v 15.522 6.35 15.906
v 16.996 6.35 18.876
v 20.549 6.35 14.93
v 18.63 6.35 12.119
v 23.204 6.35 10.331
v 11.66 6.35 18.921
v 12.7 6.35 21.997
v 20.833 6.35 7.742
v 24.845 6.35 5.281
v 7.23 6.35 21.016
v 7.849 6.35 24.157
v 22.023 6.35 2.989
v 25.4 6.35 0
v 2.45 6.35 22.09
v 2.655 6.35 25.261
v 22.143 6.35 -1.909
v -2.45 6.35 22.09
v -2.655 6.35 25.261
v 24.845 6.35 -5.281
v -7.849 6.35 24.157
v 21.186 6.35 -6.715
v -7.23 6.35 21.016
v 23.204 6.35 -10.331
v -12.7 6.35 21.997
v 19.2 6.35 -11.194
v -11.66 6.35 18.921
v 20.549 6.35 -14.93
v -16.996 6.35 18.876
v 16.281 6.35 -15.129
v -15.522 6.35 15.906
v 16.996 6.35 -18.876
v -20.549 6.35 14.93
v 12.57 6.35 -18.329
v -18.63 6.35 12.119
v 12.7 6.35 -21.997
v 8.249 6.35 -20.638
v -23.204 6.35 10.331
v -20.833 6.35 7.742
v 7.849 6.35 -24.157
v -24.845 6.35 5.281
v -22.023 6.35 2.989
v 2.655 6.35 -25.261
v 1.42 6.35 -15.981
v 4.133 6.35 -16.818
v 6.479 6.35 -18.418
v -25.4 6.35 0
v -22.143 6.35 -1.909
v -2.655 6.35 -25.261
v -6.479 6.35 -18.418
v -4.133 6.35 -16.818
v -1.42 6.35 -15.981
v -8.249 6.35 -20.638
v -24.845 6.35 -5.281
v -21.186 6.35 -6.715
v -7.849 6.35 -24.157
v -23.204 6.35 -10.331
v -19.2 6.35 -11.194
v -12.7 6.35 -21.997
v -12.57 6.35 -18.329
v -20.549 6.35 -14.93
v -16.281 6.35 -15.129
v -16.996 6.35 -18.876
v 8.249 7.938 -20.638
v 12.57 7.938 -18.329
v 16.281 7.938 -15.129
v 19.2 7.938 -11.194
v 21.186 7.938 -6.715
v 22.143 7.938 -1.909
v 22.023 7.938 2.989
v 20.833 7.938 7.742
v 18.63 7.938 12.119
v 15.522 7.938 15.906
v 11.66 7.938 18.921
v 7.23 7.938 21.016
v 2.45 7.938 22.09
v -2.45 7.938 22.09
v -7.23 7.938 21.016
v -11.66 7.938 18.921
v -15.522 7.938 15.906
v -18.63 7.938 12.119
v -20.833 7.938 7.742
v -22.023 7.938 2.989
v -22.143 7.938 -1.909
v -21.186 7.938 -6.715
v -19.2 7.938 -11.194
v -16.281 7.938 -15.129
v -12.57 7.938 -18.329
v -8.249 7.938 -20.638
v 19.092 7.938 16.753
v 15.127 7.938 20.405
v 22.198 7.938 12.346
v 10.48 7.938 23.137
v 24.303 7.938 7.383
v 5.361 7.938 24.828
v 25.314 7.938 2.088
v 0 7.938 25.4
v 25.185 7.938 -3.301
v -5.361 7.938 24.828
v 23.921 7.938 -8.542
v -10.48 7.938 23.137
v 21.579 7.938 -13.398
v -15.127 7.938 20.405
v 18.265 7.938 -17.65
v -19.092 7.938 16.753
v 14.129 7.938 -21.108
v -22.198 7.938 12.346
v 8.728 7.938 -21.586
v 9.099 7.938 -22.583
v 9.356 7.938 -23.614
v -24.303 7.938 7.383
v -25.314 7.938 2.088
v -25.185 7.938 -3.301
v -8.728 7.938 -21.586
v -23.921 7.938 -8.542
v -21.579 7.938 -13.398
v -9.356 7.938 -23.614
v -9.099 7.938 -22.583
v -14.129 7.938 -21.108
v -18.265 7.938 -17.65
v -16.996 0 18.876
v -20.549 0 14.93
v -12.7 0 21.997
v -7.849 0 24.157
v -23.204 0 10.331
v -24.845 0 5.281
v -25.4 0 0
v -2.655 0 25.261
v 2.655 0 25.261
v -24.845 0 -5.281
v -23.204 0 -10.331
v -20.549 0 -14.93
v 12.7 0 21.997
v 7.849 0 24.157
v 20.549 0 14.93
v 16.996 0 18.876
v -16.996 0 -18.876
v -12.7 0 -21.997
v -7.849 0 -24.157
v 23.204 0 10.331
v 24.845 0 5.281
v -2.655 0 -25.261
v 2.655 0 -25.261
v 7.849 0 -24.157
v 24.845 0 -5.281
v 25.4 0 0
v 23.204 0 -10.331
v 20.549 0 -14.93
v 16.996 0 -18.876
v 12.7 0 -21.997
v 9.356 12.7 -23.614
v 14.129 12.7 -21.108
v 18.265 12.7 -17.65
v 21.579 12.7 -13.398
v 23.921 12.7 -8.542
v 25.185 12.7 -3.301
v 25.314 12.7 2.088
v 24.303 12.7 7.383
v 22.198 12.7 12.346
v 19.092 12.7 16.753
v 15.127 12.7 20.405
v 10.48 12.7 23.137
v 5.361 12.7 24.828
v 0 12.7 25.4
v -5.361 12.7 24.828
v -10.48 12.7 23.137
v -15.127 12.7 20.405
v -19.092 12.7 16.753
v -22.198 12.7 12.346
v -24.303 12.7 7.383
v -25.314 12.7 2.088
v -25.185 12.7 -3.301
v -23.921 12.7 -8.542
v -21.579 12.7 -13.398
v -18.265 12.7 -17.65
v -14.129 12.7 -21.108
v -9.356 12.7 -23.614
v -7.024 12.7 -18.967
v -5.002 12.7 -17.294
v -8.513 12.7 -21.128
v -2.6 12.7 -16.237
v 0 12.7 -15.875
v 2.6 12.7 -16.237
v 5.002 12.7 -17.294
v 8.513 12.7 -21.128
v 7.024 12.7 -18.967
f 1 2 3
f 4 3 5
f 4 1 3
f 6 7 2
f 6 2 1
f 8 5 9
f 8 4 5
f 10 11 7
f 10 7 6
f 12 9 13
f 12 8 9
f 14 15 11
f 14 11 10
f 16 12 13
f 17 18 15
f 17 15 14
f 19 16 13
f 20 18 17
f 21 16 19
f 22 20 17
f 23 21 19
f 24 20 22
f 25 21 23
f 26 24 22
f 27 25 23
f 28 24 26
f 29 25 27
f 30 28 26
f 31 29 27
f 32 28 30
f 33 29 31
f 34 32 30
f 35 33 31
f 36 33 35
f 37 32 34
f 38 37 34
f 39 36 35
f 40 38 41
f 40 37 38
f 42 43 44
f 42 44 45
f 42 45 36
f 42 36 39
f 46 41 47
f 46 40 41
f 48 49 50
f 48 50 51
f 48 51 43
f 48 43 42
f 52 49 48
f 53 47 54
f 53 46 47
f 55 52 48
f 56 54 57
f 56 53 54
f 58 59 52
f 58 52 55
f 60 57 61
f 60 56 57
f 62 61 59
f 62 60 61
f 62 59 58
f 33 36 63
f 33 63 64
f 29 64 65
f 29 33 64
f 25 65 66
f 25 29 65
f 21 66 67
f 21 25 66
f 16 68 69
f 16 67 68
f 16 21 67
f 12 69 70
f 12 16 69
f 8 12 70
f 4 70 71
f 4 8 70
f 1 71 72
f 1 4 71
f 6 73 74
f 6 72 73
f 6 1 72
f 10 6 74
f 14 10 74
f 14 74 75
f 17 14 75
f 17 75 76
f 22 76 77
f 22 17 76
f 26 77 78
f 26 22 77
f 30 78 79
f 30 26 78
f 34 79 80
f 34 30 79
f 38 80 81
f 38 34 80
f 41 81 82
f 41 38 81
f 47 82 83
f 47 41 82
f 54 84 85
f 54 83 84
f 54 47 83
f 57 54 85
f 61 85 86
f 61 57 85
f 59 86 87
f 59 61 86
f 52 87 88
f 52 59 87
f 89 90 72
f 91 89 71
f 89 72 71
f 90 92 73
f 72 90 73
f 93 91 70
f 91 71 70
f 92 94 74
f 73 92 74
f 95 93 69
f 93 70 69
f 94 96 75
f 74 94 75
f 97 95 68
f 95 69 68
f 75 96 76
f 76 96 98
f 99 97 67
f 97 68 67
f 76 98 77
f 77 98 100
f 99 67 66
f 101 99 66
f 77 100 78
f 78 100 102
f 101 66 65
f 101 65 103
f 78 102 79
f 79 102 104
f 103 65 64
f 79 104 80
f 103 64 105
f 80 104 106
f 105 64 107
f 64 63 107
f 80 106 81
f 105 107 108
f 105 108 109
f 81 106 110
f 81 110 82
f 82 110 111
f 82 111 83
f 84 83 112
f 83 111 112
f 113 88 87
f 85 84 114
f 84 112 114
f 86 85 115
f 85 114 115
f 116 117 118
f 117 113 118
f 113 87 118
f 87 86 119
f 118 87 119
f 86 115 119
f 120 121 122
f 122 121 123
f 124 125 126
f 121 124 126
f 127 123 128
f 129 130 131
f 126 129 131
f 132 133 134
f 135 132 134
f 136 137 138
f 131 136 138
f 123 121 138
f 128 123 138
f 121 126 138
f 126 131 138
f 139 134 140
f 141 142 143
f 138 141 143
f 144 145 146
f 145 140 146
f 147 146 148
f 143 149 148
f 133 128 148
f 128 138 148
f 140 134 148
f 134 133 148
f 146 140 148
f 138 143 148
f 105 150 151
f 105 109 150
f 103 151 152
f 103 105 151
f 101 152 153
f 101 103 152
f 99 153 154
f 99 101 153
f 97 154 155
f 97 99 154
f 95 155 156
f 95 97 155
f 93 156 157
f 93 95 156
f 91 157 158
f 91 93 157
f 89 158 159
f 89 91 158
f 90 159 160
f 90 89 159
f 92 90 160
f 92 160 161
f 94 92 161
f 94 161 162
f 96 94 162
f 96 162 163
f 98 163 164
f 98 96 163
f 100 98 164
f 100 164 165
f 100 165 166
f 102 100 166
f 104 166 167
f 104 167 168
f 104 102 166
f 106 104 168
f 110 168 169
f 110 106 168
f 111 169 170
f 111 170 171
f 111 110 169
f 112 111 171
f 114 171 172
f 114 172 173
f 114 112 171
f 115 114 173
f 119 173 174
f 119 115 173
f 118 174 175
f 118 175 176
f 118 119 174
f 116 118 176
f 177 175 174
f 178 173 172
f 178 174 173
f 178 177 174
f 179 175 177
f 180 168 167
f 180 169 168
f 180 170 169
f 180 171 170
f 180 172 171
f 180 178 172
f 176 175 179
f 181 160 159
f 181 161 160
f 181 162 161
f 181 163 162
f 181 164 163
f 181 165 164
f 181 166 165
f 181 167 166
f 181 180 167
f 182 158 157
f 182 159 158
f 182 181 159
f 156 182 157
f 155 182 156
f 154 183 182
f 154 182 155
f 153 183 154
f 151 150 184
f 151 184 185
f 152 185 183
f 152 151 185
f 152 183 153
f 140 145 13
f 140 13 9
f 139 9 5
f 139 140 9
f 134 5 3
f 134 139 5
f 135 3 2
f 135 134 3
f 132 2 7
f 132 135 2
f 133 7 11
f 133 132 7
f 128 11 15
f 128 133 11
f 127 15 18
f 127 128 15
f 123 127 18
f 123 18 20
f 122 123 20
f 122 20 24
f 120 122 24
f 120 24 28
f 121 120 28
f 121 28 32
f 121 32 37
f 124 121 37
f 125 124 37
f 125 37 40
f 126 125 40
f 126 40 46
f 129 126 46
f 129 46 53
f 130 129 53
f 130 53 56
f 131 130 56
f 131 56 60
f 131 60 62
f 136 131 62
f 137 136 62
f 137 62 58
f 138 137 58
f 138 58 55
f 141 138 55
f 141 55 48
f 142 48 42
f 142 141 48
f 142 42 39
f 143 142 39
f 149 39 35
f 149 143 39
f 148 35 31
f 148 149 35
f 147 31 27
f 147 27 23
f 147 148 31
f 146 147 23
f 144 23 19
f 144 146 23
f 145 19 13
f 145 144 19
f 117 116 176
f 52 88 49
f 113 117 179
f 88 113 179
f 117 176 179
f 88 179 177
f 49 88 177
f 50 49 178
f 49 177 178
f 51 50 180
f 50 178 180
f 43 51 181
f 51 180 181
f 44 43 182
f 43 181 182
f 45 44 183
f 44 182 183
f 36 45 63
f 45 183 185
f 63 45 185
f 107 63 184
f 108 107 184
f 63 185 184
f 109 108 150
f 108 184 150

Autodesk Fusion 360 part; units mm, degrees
sketch "Base" plane through (0, 0, 0) normal (0, 1, 0) x (1, 0, 0)
  circle A0 centre (0, 0) radius 25.4
  dimension "d1" = 50.8
extrude "Extrude1" add sketch "Base" along normal blind 12.7 makes body 1
sketch "Relief" plane through (0, 12.7, 0) normal (0, 1, 0) x (-1, 0, 0)
  circle A0 centre (0, 0) radius 25.4
  circle A1 centre (0, -25.4) radius 9.525
  dimension "d4" = 19.05
extrude "Extrude2" cut sketch "Relief" against normal blind 6.35 contours A0 A1 | A0 A1 picked at (1.7493, -22.2335) picked at (2.3346, -28.2419) bodies 1
sketch "Boss Ref" plane through (0, 12.7, 0) normal (0, 1, 0) x (-1, 0, 0)
  arc A0 (9.3561, -23.6141) -> (-9.3561, -23.6141) centre (0, -25.4) ccw
  arc A1 (9.3561, -23.6141) -> (-9.3561, -23.6141) centre (0, 0) ccw
  circle A2 centre (0, -10.795) radius 4.7625
  circle A3 centre (0, -10.795) radius 2.5527
  dimension "d7" = 9.525
  dimension "d8" = 10.795
  dimension "d9" = 5.1054
sketch "Revolve Cut1" plane through (0, 0, 0) normal (1, 0, 0) x (0, 0, -1)
  line L0 (25.4, 0) -> (25.4, 6.35)
  line L1 (-25.4, 12.7) -> (-25.4, 0)
  line L2 (15.875, 6.35) -> (23.6141, 6.35)
  line L3 (25.4, 6.35) -> (22.225, 6.35)
  line L4 (22.225, 7.9375) -> (25.4, 7.9375)
  line L5 (25.4, 7.9375) -> (25.4, 6.35)
  line L6 (22.225, 7.9375) -> (22.225, 6.35)
  dimension "d12" = 3.175
  dimension "d13" = 1.5875
revolve "Revolve1" cut sketch "Revolve Cut1" angle 360 about axis through (0, 1.75, 0) along (0, 1, 0) bodies 1
sketch "Sketch5" plane through (0, 12.7, 0) normal (0, 1, 0) x (-1, 0, 0)
  arc A0 (9.3561, -23.6141) -> (-9.3561, -23.6141) centre (0, -25.4) ccw
  arc A1 (9.3561, -23.6141) -> (-9.3561, -23.6141) centre (0, 0) ccw
  arc A2 (-8.2489, -20.6375) -> (-9.3561, -23.6141) centre (0, -25.4) ccw
  arc A3 (9.3561, -23.6141) -> (-9.3561, -23.6141) centre (0, 0) ccw
  arc A4 (9.3561, -23.6141) -> (8.2489, -20.6375) centre (0, -25.4) ccw
  arc A5 (8.2489, -20.6375) -> (-8.2489, -20.6375) centre (0, 0) ccw
  line L0 (0, -15.875) -> (-6.35, -9.525)
  line L1 (0, -15.875) -> (6.35, -9.525)
  line L2 (6.35, -9.525) -> (-6.35, -9.525)
  line L3 (0, -9.525) -> (0, -15.875) construction
  line L4 (6.35, -3.175) -> (-6.35, -3.175)
  line L5 (6.35, -9.525) -> (6.35, -3.175)
  line L6 (-6.35, -9.525) -> (-6.35, -3.175)
  line L7 (-6.35, -3.175) -> (-12.7, -3.175)
  line L8 (-12.7, -3.175) -> (-6.35, -9.525)
  line L9 (6.35, -9.525) -> (12.7, -3.175)
  line L10 (12.7, -3.175) -> (6.35, -3.175)
  dimension "d15" = 6.35
  dimension "d16" = 45
  dimension "d17" = 6.35
ref_plane "WorkPlane1" through (0, 0, -23.6141) normal (0, 0, 1) x (1, 0, 0)
sketch "Loft Profile 2" plane through (0, 12.7, 0) normal (0, 1, 0) x (-1, 0, 0)
  arc A0 (9.3561, -23.6141) -> (-9.3561, -23.6141) centre (0, -25.4) ccw
  arc A1 (9.3561, -23.6141) -> (-9.3561, -23.6141) centre (0, 0) ccw
  line L0 (4.7625, 8.255) -> (-4.7625, 8.255)
  arc A2 (-4.7625, 8.255) -> (-4.7625, -8.255) centre (-4.7625, 0) ccw
  line L1 (-4.7625, -8.255) -> (4.7625, -8.255)
  arc A3 (4.7625, -8.255) -> (4.7625, 8.255) centre (4.7625, 0) ccw
  line L2 (4.7625, 0) -> (-4.7625, 0) construction
  dimension "d19" = 9.525
  dimension "d20" = 8.255
sketch "Loft Profile 1" plane through (0, 0, 0) normal (0, -1, 0) x (1, 0, 0)
  circle A0 centre (0, 0) radius 25.4
  circle A1 centre (0, 0) radius 6.35
  dimension "d21" = 12.7
sketch "Sweep Profile" plane through (0, 0, 0) normal (0, -1, 0) x (1, 0, 0)
  circle A0 centre (0, 0) radius 25.4
  circle A1 centre (0, 0) radius 19.05
  dimension "d22" = 38.1
sketch "Sweep Path" plane through (0, 0, 0) normal (0, 0, 1) x (1, 0, 0)
  line L0 (0, 0) -> (0, -63.5)
  arc A0 (0, -63.5) -> (50.1381, -135.1046) centre (76.2, -63.5) ccw
  line L1 (50.1381, -135.1046) -> (169.479, -178.5411)
  dimension "d23" = 76.2
  dimension "d24" = 63.5
  dimension "d25" = 127
  dimension "d26" = 110
sketch "Hole Loc1" plane through (0, 12.7, 0) normal (0, 1, 0) x (-1, 0, 0)
  arc A0 (9.3561, -23.6141) -> (-9.3561, -23.6141) centre (0, -25.4) ccw
  arc A1 (9.3561, -23.6141) -> (-9.3561, -23.6141) centre (0, 0) ccw
  line L0 (0, 0) -> (0, -15.875) construction
  line L1 (0, 0) -> (-11.2253, -11.2253) construction
  point P0 (-11.2253, -11.2253)
  point P1 (11.2253, -11.2253)
  point P2 (11.2253, 11.2253)
  point P3 (-11.2253, 11.2253)
  dimension "d27" = 45
  dimension "d29" = 360
sketch "Extrude" plane through (0, 12.7, 0) normal (0, 1, 0) x (-1, 0, 0)
  arc A0 (9.3561, -23.6141) -> (-9.3561, -23.6141) centre (0, -25.4) ccw
  arc A1 (9.3561, -23.6141) -> (-9.3561, -23.6141) centre (0, 0) ccw
  line L0 (3.175, -16.4197) -> (-3.175, -16.4197)
  line L1 (-3.175, -16.4197) -> (-3.175, -9.525)
  line L2 (-3.175, -9.525) -> (3.175, -9.525)
  line L3 (3.175, -9.525) -> (3.175, -16.4197)
  line L4 (0, -9.525) -> (0, -15.875) construction
  dimension "d30" = 6.35
  dimension "d31" = 6.35
sketch "Revolve Cut2" plane through (0, 0, 0) normal (1, 0, 0) x (0, 0, -1)
  line L0 (25.4, 3.175) -> (22.225, 3.175)
  line L1 (22.225, 3.175) -> (22.225, 1.5875)
  line L2 (22.225, 1.5875) -> (25.4, 1.5875)
  line L3 (25.4, 1.5875) -> (25.4, 3.175)
  line L4 (25.4, 0) -> (25.4, 6.35)
  line L5 (22.225, 7.9375) -> (22.225, 6.35)
sketch "New Body" plane through (0, 12.7, 0) normal (0, 1, 0) x (-1, 0, 0)
  arc A0 (-4.7625, 8.255) -> (-4.7625, -8.255) centre (-4.7625, 0) ccw
  line L0 (-4.7625, -8.255) -> (4.7625, -8.255)
  arc A1 (4.7625, -8.255) -> (4.7625, 8.255) centre (4.7625, 0) ccw
  line L1 (4.7625, 8.255) -> (-4.7625, 8.255)
  line L2 (-4.7625, -9.525) -> (4.7625, -9.525)
  arc A2 (4.7625, -9.525) -> (4.7625, 9.525) centre (4.7625, 0) ccw
  line L3 (4.7625, 9.525) -> (-4.7625, 9.525)
  arc A3 (-4.7625, 9.525) -> (-4.7625, -9.525) centre (-4.7625, 0) ccw
  dimension "d32" = 1.27
extrude "Extrude4" add sketch "New Body" along normal blind 6.35 separate body contours A0 L0 A1 L1 | L2 A2 L3 A3 makes body 2
sketch "Sweep Guide" plane through (0, 0, 0) normal (0, 0, 1) x (1, 0, 0)
  line L0 (-25.4, 0) -> (25.4, 0)
  line L1 (25.4, 0) -> (25.4, -63.5)
  arc A0 (25.4, -63.5) -> (76.2, -114.3) centre (76.2, -63.5) ccw
  line L2 (76.2, -114.3) -> (169.479, -114.3)
  point P0 (76.2, -63.5)
  point P1 (169.479, -178.5411)
hidden bodies 2
equation "d17 = d15"
